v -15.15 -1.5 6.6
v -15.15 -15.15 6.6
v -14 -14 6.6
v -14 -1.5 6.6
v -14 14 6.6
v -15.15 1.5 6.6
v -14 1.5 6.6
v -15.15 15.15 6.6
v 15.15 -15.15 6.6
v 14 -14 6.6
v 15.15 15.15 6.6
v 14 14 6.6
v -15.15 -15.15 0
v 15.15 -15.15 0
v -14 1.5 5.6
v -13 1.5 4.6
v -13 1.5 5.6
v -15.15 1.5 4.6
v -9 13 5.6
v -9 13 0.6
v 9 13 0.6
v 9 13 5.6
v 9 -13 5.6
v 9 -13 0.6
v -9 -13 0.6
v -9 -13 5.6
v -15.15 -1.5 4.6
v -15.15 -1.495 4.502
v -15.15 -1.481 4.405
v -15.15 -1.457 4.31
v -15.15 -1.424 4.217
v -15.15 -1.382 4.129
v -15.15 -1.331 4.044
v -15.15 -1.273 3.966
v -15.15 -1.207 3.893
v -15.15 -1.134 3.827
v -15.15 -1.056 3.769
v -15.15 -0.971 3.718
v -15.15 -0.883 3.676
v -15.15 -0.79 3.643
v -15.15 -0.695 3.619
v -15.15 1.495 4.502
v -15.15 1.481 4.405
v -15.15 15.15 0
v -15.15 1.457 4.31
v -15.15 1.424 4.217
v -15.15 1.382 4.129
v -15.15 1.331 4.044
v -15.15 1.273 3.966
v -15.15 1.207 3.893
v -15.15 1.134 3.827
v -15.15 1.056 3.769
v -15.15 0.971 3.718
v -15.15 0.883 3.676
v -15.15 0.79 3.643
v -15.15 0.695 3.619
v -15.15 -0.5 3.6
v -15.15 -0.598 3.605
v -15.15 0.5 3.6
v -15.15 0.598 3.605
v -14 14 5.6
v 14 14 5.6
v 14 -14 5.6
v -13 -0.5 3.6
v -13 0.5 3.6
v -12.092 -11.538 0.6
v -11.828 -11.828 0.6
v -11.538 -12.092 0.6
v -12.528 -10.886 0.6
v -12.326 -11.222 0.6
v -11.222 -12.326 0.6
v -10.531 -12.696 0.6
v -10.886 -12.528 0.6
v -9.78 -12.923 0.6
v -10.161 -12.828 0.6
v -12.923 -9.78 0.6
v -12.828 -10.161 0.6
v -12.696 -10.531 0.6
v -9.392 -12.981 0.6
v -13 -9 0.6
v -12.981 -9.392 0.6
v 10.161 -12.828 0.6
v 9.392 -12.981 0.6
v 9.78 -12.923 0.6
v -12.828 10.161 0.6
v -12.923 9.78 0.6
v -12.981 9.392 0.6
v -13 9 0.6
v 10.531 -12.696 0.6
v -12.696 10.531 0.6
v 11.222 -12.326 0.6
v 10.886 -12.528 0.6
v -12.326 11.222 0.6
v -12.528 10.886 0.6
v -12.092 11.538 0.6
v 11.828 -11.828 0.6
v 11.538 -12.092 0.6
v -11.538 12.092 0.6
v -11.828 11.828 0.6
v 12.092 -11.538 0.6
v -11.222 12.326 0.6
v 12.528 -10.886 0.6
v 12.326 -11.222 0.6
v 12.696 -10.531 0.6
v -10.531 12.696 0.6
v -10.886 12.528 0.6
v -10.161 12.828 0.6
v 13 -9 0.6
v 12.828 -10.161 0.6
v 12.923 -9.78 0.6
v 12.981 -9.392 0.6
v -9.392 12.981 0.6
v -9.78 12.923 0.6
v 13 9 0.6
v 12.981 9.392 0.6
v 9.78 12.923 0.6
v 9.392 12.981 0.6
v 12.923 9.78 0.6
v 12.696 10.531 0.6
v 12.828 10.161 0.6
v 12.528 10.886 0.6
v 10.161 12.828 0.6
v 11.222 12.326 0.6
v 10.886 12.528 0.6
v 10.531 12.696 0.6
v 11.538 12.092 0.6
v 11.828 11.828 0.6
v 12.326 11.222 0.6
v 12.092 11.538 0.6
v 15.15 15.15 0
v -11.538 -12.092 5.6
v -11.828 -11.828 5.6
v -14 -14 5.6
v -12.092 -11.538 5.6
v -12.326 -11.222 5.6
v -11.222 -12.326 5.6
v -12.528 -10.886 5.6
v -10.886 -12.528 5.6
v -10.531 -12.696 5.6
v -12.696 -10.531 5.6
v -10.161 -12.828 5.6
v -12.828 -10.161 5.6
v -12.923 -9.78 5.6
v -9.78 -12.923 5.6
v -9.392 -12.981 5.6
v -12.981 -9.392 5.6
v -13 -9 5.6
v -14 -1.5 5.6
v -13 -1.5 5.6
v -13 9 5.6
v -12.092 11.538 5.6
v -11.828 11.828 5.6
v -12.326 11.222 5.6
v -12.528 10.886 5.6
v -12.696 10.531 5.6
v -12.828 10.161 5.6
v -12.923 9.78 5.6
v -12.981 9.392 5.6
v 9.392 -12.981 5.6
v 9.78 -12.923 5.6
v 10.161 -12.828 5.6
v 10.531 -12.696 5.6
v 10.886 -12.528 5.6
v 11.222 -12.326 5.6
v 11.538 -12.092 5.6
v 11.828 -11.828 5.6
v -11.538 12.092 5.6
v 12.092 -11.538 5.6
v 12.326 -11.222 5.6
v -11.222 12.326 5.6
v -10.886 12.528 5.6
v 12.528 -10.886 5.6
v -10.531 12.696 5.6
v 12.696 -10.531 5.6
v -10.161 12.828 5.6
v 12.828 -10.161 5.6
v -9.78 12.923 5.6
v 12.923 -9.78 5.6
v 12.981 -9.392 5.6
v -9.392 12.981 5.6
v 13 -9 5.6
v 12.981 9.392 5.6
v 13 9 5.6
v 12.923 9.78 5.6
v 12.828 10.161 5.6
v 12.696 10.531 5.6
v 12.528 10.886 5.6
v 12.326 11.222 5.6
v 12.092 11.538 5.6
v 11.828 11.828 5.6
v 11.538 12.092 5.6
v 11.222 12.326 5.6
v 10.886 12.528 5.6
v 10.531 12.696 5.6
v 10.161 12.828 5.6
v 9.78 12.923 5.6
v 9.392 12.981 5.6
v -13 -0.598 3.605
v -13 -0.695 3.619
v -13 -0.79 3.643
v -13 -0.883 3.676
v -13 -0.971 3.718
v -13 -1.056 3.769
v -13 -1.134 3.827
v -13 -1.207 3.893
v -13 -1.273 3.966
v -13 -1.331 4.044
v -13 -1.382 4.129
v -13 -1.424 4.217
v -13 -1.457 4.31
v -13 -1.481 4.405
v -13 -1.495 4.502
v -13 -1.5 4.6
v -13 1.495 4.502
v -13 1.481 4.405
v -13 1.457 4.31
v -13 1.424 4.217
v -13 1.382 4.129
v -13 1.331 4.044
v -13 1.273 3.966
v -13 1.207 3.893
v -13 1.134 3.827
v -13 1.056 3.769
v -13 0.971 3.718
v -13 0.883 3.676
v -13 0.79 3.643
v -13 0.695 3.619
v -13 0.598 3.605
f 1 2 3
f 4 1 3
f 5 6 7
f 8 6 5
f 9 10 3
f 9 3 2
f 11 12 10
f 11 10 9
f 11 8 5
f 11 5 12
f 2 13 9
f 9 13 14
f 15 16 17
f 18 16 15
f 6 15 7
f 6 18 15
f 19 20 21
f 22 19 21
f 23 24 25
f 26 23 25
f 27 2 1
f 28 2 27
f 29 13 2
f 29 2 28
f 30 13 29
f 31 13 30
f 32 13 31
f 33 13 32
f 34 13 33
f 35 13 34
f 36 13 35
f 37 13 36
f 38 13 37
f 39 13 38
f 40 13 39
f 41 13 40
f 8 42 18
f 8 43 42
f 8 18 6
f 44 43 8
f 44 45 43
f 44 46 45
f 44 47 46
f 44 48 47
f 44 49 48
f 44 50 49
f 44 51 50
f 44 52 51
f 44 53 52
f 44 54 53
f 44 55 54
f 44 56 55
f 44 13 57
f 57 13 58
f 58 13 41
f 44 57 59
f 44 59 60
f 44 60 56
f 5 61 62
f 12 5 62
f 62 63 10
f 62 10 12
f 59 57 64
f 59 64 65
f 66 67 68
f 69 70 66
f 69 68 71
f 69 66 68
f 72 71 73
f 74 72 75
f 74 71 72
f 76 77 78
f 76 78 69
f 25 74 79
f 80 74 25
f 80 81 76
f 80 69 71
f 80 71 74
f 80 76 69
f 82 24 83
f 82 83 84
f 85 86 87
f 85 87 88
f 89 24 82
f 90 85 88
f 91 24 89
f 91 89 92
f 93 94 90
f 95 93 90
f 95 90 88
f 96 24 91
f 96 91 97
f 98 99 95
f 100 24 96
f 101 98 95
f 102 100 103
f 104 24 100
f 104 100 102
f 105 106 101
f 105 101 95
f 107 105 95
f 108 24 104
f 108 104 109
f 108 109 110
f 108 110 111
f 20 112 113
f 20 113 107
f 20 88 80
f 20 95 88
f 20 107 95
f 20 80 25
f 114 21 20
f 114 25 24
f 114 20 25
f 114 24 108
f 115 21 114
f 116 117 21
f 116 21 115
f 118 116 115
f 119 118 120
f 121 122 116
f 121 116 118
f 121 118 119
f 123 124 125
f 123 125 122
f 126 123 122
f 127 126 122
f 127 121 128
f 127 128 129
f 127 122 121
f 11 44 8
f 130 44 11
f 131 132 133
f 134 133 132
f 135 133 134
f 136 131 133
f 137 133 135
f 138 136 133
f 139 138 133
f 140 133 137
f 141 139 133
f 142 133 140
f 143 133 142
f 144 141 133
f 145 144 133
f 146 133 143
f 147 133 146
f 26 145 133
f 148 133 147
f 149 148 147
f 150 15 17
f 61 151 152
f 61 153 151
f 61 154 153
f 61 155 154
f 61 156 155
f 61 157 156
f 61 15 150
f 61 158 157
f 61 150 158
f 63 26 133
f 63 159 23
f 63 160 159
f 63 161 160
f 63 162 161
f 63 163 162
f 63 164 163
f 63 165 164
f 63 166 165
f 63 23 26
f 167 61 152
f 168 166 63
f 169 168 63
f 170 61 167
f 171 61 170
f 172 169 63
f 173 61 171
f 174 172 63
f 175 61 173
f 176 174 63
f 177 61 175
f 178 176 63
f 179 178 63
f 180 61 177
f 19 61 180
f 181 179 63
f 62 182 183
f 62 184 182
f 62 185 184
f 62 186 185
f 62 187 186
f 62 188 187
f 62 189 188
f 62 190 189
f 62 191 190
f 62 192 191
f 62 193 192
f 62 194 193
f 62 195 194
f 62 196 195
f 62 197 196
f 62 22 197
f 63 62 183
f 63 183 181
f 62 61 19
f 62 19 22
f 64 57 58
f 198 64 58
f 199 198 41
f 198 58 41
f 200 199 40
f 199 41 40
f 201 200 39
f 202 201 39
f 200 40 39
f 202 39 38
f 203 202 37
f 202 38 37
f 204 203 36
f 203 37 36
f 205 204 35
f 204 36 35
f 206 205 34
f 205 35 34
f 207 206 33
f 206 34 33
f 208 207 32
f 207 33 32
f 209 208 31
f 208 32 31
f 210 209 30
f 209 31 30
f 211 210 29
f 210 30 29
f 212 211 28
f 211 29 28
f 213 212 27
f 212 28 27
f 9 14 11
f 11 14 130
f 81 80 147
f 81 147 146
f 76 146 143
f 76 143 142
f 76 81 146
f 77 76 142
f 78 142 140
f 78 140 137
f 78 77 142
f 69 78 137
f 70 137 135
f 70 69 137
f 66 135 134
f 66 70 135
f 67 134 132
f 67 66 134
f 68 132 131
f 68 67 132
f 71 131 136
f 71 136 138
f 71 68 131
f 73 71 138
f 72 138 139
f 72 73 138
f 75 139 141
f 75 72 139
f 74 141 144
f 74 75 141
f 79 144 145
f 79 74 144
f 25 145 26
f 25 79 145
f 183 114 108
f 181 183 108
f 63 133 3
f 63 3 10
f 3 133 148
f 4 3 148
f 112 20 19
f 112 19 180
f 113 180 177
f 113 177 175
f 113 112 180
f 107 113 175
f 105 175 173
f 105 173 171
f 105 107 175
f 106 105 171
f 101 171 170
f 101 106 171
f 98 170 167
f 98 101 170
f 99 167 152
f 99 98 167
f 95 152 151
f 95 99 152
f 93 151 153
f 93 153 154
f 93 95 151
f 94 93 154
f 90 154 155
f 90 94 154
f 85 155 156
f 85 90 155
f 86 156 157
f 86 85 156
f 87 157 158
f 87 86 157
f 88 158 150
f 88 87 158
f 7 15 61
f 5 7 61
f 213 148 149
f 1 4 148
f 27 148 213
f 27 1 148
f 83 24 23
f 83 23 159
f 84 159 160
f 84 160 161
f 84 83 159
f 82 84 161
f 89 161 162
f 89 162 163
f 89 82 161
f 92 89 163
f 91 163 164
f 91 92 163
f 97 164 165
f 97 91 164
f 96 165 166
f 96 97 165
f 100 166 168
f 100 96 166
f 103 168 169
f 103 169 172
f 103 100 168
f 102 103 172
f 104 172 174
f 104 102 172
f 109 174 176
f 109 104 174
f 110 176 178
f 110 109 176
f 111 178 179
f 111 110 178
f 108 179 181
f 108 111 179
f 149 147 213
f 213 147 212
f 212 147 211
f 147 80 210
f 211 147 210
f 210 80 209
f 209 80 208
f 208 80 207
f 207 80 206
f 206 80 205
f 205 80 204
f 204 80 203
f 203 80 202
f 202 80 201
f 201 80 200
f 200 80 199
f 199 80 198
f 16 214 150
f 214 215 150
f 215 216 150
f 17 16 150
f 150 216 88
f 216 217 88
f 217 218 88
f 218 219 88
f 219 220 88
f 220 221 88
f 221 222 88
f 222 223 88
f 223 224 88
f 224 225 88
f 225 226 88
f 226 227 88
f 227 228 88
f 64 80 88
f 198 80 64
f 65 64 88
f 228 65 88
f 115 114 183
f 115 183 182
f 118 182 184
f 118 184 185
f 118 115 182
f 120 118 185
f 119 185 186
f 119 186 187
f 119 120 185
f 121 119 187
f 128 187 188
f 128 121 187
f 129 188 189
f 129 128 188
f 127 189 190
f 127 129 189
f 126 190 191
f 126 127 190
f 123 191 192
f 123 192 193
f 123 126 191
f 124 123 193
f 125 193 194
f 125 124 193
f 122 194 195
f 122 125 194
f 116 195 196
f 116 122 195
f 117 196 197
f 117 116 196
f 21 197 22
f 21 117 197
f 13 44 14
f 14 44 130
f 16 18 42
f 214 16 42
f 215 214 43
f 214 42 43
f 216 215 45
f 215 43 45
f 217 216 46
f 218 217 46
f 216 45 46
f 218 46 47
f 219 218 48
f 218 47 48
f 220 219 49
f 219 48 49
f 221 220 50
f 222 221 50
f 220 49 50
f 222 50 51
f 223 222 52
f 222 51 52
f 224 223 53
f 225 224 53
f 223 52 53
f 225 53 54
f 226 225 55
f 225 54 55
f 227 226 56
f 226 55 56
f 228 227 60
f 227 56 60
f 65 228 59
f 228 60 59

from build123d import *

# Parameters (mm, degrees)
SKETCH_W      = 30.3
SKETCH_H      = 30.3
PAD_DEPTH     = 0.6
SKETCH001_W   = 28
SKETCH001_H   = 28
PAD001_DEPTH  = 5
SKETCH003_W   = 30.3
SKETCH003_H   = 30.3
SKETCH003_W_2 = 28
SKETCH003_H_2 = 28
PAD002_DEPTH  = 6
POCKET_DEPTH  = 2.15


with BuildPart() as part:
    # Sketch → Pad (new body)
    with BuildSketch(Plane.XY):
        Rectangle(SKETCH_W, SKETCH_H)
    extrude(amount=PAD_DEPTH)

    # Sketch001 (on Face6 of Pad) → Pad001 (join)
    with BuildSketch(Plane.XY.offset(0.6)):
        Rectangle(SKETCH001_W, SKETCH001_H)
        with BuildLine():
            Line((-9, 13), (9, 13))
            ThreePointArc((13, 9), (11.828427, 11.828427), (9, 13))
            Line((13, 9), (13, -9))
            ThreePointArc((9, -13), (11.828427, -11.828427), (13, -9))
            Line((9, -13), (-9, -13))
            ThreePointArc((-13, -9), (-11.828427, -11.828427), (-9, -13))
            Line((-13, -9), (-13, 9))
            ThreePointArc((-9, 13), (-11.828427, 11.828427), (-13, 9))
        make_face(mode=Mode.SUBTRACT)
    extrude(amount=PAD001_DEPTH)

    # Sketch003 (on Face5 of Pad001) → Pad002 (join)
    with BuildSketch(Plane.XY.offset(0.6)):
        Rectangle(SKETCH003_W, SKETCH003_H)
        Rectangle(SKETCH003_W_2, SKETCH003_H_2, mode=Mode.SUBTRACT)
    extrude(amount=PAD002_DEPTH)

    # Sketch004 (on Face7 of Pad002) → Pocket (cut)
    with BuildSketch(Plane(origin=(-15.15, 0, 0), x_dir=(0, -1, 0), z_dir=(-1, 0, 0))):
        with BuildLine():
            Line((-1.5, 6.6), (1.5, 6.6))
            Line((1.5, 6.6), (1.5, 4.6))
            ThreePointArc((0.5, 3.6), (1.207107, 3.892893), (1.5, 4.6))
            Line((0.5, 3.6), (-0.5, 3.6))
            ThreePointArc((-1.5, 4.6), (-1.207107, 3.892893), (-0.5, 3.6))
            Line((-1.5, 4.6), (-1.5, 6.6))
        make_face()
    extrude(amount=-POCKET_DEPTH, mode=Mode.SUBTRACT)


solid = part.part
